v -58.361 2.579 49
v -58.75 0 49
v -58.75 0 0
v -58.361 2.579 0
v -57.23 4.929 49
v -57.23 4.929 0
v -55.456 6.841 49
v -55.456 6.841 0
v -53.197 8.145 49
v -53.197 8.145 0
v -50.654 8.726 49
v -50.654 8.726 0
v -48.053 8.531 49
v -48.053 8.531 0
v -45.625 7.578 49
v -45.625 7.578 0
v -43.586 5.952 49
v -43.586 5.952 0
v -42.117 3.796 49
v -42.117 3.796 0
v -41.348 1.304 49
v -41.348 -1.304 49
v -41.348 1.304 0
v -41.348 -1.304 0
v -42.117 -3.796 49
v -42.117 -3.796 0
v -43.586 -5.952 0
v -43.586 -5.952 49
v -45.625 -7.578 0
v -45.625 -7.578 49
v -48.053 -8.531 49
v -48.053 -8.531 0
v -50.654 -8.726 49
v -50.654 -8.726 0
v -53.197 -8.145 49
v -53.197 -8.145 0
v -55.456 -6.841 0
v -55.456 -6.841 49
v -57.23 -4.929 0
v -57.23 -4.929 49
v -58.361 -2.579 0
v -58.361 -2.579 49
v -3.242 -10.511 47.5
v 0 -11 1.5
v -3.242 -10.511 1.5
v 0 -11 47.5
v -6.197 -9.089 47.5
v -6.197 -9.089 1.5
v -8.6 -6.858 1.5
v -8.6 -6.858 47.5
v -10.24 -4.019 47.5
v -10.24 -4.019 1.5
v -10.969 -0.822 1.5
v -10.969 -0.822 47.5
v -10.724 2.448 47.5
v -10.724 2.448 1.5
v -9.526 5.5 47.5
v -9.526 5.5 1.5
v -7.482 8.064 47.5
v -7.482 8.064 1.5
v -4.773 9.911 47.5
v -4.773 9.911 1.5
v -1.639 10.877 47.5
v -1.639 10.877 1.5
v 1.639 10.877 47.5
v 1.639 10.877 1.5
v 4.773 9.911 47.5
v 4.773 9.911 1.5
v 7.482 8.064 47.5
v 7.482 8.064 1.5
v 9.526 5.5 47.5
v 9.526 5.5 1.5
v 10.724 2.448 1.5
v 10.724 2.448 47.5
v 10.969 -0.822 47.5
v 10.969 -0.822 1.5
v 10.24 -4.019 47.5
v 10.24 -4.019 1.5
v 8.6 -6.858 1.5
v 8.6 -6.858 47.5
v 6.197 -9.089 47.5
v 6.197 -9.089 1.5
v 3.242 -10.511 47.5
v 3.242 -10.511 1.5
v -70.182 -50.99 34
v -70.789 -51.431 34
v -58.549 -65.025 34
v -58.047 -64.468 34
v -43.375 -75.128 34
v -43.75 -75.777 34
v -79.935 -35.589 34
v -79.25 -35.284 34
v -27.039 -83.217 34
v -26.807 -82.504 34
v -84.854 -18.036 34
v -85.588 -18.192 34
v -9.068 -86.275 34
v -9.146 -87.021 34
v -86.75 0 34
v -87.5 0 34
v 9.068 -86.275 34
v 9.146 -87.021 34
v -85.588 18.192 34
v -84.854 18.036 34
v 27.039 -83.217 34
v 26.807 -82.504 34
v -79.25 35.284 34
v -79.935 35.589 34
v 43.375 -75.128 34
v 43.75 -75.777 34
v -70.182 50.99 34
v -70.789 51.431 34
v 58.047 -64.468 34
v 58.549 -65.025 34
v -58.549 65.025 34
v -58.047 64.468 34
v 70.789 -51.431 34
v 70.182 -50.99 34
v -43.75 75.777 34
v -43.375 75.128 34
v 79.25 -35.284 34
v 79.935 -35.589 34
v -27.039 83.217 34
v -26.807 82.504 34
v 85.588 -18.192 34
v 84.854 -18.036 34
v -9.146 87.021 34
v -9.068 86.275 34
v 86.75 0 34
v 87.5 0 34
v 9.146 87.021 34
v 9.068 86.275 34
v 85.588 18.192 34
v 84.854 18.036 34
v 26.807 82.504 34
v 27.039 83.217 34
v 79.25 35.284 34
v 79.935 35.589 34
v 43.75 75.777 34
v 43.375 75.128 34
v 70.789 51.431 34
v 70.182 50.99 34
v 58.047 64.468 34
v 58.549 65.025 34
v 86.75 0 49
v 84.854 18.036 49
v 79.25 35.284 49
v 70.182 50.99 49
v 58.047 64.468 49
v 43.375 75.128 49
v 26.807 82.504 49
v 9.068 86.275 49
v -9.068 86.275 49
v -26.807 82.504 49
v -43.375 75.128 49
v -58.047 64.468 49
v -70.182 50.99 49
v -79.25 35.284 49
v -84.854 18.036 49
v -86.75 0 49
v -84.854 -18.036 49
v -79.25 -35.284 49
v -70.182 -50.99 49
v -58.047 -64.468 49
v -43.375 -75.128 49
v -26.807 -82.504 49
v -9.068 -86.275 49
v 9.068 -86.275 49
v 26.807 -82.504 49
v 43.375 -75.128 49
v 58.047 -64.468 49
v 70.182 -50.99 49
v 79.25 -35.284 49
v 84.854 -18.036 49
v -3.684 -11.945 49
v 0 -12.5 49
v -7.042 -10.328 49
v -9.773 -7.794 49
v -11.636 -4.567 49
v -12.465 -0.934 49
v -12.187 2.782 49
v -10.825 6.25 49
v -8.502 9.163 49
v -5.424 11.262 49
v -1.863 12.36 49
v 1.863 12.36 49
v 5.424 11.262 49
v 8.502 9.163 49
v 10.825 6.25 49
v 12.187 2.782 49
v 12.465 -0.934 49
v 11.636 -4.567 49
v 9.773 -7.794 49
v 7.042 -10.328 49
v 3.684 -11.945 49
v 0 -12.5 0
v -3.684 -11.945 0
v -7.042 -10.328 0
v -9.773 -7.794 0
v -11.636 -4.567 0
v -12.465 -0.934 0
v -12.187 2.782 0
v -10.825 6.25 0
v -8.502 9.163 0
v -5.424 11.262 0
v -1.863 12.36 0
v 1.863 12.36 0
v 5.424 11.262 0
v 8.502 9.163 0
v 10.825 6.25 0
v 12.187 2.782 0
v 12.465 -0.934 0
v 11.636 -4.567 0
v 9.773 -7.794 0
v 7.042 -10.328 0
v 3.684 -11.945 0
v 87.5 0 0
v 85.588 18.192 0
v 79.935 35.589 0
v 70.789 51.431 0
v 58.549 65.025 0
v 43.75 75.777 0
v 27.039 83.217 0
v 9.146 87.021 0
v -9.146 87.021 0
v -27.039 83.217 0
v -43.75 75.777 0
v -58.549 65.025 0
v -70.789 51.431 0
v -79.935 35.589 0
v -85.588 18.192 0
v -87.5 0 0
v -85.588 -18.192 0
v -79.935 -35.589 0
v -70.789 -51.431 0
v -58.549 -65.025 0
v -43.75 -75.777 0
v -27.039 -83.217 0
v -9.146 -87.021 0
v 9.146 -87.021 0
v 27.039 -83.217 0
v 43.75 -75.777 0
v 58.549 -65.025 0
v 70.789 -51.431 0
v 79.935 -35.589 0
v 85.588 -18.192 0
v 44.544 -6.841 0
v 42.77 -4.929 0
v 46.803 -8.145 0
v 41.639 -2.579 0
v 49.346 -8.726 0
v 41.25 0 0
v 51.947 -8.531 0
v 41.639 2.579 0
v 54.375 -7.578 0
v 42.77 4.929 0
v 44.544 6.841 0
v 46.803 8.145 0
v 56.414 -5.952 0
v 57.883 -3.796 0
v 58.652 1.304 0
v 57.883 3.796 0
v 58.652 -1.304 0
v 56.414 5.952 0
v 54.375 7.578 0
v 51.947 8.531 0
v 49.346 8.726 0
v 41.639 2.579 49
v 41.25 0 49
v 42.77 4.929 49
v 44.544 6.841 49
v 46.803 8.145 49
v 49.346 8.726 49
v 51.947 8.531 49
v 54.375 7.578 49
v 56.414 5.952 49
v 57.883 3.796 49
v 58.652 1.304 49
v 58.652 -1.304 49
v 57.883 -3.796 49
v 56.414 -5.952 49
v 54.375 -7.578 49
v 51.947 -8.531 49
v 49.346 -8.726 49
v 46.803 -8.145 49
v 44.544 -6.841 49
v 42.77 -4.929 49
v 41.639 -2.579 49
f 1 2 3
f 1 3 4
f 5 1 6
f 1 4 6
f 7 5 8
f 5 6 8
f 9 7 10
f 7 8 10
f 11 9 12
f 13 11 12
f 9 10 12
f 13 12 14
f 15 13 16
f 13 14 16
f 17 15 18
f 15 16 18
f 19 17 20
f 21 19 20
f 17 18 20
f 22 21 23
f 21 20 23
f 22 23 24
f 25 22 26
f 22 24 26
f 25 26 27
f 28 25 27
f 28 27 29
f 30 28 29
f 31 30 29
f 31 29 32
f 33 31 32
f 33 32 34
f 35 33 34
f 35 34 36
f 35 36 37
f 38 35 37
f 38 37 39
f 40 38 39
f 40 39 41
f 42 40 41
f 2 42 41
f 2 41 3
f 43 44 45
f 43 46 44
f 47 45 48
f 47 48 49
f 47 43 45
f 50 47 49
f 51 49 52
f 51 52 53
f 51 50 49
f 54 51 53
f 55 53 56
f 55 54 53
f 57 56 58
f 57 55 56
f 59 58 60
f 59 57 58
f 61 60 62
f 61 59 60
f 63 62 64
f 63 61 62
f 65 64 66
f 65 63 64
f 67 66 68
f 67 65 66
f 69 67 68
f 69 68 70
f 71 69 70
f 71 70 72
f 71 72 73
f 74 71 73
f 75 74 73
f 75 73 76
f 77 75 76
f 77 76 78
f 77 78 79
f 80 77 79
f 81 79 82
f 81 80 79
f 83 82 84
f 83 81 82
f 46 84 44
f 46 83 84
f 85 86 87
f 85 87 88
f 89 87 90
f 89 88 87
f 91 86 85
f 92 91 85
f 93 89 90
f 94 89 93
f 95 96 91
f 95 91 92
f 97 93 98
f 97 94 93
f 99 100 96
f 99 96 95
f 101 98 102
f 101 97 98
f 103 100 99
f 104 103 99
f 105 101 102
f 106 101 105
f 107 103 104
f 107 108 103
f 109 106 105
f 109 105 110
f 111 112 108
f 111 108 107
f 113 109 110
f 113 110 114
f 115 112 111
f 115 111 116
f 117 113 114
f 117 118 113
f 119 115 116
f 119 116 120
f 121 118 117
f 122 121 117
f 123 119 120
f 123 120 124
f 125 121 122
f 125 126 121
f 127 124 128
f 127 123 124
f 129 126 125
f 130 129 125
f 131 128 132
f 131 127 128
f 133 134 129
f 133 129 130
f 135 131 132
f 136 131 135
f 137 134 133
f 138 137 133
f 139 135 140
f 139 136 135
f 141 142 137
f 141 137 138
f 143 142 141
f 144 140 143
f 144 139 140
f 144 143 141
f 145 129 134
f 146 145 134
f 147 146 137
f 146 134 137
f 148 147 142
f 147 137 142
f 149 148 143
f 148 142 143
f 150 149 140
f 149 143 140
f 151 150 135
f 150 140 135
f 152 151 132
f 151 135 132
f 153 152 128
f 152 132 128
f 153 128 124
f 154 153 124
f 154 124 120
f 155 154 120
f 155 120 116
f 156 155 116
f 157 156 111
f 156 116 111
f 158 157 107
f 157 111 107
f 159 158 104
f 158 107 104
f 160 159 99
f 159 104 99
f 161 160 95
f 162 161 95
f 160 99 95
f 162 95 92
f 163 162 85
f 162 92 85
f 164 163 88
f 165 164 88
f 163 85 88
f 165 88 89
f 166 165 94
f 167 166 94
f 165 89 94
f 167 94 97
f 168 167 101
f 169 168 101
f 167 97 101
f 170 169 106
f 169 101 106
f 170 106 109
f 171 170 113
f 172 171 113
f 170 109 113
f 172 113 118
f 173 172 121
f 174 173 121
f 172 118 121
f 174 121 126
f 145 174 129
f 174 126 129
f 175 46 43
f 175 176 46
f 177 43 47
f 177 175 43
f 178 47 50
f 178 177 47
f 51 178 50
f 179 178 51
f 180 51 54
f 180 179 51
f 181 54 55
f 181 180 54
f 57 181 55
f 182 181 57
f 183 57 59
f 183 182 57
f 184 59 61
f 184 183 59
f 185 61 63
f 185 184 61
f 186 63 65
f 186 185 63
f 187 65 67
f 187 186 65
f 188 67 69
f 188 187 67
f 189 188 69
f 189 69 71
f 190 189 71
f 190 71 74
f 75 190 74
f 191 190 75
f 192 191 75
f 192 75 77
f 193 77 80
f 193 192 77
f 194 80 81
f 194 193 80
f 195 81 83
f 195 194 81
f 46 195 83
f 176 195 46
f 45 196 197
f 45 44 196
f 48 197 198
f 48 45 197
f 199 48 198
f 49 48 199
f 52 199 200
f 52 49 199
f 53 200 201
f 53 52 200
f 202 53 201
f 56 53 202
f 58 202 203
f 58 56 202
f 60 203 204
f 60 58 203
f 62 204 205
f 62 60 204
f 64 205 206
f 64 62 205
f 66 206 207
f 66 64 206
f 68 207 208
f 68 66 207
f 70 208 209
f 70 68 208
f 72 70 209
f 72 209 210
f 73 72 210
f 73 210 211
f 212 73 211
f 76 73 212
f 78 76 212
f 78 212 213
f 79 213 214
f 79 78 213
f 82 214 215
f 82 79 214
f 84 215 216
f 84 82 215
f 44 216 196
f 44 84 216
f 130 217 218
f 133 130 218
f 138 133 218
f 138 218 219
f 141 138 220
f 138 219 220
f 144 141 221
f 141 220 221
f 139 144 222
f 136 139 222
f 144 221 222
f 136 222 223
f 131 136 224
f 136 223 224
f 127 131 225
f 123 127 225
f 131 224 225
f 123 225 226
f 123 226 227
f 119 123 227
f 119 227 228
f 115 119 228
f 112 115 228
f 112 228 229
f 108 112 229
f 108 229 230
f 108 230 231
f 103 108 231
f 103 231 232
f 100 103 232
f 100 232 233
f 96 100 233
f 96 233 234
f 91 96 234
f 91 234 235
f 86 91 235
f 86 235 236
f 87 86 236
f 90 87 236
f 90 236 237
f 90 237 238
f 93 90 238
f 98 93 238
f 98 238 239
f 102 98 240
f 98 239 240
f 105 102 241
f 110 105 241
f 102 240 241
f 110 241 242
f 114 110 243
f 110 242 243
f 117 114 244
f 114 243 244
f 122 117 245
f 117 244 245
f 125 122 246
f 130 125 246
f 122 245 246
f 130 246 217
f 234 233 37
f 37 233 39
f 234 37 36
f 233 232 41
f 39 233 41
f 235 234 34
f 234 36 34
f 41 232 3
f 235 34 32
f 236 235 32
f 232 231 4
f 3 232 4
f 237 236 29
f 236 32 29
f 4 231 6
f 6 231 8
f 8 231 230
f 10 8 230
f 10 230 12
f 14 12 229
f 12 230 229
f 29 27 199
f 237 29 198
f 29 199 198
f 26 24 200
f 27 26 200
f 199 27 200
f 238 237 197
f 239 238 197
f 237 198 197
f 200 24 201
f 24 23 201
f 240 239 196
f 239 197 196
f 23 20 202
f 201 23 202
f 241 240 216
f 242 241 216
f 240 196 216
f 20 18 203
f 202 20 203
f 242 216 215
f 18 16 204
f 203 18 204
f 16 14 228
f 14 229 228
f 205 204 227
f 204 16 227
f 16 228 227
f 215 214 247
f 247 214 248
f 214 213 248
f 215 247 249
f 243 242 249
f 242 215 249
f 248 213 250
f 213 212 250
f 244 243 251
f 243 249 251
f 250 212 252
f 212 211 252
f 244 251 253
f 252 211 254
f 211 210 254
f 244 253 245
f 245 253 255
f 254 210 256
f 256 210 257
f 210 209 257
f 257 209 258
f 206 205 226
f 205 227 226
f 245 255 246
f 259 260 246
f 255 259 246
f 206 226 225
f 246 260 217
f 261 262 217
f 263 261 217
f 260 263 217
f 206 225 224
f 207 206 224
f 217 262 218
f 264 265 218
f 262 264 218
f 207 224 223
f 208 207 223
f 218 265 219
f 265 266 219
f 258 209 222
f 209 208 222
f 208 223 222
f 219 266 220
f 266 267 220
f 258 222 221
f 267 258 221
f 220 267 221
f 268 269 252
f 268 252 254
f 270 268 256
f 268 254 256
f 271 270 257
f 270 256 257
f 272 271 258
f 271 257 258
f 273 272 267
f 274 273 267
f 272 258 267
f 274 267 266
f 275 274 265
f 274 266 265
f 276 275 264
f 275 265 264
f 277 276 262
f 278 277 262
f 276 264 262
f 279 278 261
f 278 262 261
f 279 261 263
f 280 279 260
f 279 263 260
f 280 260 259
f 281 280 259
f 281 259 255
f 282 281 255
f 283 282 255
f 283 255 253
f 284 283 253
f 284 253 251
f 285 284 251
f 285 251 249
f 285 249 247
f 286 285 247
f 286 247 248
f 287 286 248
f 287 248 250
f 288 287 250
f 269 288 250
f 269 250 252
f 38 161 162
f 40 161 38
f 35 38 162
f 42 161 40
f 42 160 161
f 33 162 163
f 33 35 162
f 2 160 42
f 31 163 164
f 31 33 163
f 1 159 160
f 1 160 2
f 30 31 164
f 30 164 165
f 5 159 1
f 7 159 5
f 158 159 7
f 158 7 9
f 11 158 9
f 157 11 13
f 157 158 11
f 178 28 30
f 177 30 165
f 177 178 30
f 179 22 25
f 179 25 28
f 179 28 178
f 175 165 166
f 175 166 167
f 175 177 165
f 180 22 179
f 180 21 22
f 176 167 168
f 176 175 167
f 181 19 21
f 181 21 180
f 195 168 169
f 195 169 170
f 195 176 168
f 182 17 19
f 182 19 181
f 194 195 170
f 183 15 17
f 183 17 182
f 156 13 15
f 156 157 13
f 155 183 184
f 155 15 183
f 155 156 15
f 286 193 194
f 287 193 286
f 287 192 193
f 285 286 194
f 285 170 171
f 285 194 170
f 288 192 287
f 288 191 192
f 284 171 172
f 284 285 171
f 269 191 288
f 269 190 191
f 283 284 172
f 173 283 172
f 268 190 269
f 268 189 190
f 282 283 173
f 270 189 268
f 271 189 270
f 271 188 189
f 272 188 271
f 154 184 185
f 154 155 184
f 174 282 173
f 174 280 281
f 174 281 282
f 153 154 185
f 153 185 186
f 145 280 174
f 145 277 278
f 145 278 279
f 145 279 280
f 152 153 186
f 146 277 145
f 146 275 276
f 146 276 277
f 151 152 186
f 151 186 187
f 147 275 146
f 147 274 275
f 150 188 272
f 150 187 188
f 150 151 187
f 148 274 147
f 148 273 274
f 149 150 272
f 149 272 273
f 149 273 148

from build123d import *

# Parameters (mm, degrees)
SKETCH1_R           = 87.5
BOSS_EXTRUDE1_DEPTH = 49
CUT_EXTRUDE1_START  = -15
SKETCH2_R           = 87.5
SKETCH2_R_2         = 86.75
CUT_EXTRUDE1_DEPTH  = 15
M20_TAPPED_HOLE1_D  = 17.5


with BuildPart() as part:
    # Sketch1 → Boss-Extrude1 (new body)
    with BuildSketch(Plane.XY):
        Circle(SKETCH1_R)
    extrude(amount=BOSS_EXTRUDE1_DEPTH)

    # Sketch2 → Cut-Extrude1 (cut)
    with BuildSketch(Plane.XY.offset(49).offset(CUT_EXTRUDE1_START)):
        Circle(SKETCH2_R)
        Circle(SKETCH2_R_2, mode=Mode.SUBTRACT)
    extrude(amount=CUT_EXTRUDE1_DEPTH, mode=Mode.SUBTRACT)

    # M20 Tapped Hole1 (through all)
    with Locations(Plane.XY.offset(49)):
        with Locations((-50, 0), (50, 0)):
            Hole(M20_TAPPED_HOLE1_D / 2)

    # Sketch6 → Ø22.0 (22) Diameter Hole1 (revolve, cut)
    with BuildSketch(Plane(origin=(0, 0, 49), x_dir=(0, -1, 0), z_dir=(1, 0, 0))):
        Polygon((0, 0), (0, 49), (12.5, 49), (11, 47.5), (11, 1.5), (12.5, 0), align=None)
    revolve(axis=Axis((0, 0, 55.35), (0, 0, -1)), mode=Mode.SUBTRACT)


solid = part.part
